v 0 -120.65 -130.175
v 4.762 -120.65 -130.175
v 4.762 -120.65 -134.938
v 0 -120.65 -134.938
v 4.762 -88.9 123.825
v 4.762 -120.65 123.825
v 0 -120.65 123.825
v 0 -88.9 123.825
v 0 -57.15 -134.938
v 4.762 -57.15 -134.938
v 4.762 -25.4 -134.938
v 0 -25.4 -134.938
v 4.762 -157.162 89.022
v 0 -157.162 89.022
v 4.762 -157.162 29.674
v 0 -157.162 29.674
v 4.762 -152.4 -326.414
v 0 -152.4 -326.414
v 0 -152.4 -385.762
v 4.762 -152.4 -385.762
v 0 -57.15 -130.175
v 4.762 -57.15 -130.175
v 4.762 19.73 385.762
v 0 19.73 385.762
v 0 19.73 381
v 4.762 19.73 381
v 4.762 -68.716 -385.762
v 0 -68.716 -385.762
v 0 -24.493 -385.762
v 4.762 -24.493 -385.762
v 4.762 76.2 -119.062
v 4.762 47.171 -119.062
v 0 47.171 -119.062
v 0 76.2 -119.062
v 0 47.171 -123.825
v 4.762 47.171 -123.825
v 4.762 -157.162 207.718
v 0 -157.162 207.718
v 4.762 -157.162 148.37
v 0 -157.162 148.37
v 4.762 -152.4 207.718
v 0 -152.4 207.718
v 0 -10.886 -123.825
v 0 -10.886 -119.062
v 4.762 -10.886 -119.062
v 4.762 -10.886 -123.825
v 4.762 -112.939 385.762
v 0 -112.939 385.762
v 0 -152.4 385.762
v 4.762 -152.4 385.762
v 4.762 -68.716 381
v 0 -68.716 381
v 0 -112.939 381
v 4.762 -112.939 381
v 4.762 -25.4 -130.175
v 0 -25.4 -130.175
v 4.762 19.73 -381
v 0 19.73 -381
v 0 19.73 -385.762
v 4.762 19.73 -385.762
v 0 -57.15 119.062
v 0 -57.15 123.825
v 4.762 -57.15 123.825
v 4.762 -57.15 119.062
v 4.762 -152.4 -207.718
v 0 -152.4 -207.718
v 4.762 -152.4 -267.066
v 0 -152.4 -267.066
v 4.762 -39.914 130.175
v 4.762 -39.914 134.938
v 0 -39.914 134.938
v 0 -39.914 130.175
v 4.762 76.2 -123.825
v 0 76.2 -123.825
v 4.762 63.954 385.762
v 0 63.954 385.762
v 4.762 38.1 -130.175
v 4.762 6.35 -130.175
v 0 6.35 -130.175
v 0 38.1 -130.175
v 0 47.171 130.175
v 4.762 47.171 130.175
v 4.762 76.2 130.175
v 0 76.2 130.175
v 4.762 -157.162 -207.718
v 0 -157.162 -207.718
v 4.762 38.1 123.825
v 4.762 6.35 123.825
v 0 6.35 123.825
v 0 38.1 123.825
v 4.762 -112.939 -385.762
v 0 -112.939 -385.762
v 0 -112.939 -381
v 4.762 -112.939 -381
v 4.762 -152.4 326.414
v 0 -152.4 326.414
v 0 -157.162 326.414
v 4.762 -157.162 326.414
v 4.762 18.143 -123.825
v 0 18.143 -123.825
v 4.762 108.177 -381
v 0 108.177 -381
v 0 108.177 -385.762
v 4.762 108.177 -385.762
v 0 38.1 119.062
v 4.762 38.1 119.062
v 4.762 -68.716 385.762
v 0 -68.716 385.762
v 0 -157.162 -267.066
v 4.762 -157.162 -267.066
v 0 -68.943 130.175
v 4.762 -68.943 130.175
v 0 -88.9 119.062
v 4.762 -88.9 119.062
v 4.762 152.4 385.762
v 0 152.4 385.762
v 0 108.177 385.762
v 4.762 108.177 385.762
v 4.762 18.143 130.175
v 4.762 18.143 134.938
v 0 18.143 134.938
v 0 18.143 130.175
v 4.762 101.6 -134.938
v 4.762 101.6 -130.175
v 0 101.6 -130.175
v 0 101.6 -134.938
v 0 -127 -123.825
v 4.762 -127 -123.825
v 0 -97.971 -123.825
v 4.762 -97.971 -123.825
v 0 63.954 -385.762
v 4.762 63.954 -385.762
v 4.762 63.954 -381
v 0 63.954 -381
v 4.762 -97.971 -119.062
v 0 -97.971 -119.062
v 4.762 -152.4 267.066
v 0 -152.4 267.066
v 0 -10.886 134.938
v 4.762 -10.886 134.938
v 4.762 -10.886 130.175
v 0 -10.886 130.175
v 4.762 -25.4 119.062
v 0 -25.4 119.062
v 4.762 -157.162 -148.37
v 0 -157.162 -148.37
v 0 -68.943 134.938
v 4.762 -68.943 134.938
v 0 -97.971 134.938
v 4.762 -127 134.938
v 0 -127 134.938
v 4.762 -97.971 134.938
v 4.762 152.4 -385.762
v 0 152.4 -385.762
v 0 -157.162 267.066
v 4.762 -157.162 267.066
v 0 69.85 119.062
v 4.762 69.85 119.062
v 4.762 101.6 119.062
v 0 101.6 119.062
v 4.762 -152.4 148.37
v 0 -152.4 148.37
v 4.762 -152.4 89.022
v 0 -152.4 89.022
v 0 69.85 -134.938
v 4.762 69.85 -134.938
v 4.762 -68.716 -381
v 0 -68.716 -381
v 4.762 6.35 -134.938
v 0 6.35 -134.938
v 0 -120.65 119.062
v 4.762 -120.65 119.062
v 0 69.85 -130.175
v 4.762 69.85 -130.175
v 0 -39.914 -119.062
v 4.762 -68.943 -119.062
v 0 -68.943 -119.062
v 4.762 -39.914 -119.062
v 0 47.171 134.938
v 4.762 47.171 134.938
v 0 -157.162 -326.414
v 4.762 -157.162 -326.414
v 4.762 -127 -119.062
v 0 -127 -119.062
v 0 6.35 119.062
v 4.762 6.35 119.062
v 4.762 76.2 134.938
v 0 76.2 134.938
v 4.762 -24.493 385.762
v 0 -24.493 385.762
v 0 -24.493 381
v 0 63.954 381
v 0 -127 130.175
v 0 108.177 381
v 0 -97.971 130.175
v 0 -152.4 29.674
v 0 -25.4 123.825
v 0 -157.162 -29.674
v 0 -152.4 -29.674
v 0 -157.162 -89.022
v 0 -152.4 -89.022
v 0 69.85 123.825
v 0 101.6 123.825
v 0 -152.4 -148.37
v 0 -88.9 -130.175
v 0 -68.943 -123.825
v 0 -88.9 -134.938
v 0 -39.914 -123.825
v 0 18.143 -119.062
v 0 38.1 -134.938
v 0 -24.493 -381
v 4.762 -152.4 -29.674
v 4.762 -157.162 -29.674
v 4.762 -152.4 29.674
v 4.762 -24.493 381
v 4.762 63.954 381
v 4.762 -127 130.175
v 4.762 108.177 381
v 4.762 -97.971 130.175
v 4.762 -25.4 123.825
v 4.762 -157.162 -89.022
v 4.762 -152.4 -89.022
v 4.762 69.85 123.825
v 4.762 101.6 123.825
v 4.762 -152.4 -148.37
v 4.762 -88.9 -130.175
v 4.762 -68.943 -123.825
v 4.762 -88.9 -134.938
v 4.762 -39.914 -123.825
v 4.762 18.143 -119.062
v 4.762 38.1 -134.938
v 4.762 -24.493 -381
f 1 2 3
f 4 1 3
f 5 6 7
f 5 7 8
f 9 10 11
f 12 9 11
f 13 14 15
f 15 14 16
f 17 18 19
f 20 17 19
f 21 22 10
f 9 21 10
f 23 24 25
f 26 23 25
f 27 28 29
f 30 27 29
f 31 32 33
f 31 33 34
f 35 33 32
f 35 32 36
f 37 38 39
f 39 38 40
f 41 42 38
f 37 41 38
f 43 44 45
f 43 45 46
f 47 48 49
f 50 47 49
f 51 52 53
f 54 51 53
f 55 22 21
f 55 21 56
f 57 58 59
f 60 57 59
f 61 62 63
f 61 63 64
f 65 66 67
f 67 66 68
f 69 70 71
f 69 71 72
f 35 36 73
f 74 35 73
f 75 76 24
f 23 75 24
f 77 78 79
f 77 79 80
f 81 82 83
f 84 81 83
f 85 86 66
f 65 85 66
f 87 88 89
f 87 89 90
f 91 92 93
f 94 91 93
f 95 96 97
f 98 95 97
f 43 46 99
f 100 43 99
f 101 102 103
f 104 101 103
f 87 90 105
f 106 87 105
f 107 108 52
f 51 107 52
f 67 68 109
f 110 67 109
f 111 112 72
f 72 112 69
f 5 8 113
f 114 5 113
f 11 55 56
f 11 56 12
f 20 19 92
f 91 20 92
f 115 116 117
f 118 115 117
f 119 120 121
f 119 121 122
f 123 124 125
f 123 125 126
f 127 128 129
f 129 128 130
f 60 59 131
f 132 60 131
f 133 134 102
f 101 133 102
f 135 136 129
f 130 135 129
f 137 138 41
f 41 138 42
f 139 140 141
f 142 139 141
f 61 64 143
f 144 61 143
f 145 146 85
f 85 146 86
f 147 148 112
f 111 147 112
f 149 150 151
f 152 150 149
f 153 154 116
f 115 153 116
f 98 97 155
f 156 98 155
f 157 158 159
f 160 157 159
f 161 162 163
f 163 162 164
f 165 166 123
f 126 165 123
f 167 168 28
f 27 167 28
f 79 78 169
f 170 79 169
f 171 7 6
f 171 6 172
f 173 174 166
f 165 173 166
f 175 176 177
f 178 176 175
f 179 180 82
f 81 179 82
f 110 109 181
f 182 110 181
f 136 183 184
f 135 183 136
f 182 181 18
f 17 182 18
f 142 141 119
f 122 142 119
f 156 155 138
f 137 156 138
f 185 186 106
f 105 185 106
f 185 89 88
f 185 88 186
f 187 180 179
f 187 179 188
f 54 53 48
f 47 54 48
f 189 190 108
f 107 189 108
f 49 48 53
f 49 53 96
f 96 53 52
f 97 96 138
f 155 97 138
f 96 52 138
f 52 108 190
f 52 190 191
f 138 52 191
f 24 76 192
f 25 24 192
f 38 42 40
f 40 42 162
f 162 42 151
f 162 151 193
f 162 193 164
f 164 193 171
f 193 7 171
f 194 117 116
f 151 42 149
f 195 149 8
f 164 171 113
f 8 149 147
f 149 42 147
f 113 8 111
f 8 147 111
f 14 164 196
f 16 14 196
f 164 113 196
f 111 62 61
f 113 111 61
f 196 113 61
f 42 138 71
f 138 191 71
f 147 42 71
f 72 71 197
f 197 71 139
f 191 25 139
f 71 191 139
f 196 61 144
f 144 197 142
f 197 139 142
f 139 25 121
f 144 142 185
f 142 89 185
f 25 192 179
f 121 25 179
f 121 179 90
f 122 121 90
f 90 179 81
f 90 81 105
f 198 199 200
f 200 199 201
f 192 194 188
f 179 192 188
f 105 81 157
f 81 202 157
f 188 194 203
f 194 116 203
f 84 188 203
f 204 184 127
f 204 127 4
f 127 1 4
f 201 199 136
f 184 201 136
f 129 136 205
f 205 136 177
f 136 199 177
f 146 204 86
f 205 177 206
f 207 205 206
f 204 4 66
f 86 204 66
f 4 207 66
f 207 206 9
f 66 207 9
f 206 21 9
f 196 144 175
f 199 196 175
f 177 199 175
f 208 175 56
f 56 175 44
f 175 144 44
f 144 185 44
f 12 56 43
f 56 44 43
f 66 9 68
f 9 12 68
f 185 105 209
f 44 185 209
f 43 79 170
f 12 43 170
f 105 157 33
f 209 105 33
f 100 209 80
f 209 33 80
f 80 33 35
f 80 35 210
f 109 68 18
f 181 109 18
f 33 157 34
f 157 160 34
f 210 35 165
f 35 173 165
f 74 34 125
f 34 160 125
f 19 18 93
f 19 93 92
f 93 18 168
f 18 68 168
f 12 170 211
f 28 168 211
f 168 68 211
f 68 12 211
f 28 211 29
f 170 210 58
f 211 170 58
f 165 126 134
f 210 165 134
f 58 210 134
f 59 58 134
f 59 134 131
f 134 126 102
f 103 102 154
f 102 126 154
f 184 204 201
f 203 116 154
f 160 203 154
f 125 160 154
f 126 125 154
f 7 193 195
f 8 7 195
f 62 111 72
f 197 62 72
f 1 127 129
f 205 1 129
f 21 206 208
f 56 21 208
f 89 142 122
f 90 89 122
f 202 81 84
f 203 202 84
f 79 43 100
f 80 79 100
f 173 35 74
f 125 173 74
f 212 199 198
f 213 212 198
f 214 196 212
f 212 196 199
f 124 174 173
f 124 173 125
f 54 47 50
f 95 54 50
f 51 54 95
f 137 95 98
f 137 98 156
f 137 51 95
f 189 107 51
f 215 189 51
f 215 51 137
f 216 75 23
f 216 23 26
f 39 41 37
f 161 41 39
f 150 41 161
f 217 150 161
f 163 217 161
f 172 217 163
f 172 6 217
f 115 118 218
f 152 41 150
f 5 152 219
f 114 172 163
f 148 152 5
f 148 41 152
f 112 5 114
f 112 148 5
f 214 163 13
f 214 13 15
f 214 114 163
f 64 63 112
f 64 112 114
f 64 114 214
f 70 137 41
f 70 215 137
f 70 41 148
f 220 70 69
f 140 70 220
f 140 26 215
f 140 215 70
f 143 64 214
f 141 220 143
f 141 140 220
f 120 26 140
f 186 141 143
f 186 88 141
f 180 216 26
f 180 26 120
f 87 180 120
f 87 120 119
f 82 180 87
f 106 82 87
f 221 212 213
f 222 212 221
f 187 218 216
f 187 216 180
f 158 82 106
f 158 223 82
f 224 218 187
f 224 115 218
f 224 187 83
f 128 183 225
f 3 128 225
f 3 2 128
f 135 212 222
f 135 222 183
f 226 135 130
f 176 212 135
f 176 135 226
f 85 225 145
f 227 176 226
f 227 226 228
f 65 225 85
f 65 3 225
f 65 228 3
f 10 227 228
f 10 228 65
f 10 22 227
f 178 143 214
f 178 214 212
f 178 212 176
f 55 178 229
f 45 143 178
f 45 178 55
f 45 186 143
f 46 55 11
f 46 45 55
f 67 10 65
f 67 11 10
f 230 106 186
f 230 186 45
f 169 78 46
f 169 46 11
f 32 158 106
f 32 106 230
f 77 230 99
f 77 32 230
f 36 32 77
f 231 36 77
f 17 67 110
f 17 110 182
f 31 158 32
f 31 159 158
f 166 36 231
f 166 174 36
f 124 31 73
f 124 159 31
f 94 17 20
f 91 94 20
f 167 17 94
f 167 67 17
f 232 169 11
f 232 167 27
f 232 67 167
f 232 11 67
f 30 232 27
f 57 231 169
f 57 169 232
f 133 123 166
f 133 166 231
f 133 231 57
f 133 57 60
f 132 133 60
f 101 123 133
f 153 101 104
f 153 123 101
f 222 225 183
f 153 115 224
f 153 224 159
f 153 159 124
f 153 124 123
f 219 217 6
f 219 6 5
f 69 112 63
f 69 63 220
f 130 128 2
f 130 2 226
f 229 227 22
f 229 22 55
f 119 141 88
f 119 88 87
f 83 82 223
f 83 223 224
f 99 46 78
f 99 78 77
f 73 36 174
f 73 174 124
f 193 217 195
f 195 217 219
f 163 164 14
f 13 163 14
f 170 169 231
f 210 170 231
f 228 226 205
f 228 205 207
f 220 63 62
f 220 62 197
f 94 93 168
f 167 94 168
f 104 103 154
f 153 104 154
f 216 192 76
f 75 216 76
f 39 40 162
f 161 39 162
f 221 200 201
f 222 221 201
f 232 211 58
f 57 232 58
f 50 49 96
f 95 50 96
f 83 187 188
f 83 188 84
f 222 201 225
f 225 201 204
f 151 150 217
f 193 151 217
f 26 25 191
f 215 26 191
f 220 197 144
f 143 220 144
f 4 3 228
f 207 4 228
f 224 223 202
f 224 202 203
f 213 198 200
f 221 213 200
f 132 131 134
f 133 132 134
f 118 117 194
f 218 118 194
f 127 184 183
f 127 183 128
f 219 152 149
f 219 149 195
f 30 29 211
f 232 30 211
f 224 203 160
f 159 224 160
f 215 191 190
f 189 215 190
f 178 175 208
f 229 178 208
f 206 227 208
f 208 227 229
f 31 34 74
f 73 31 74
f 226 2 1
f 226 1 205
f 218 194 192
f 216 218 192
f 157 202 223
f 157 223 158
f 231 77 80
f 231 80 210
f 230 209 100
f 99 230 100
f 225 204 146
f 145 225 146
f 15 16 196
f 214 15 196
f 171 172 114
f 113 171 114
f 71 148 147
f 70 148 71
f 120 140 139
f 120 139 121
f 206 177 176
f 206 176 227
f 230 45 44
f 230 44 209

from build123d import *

# Parameters (mm, degrees)
BOSS_EXTRUDE1_DEPTH = 4.7625
SKETCH3_W           = 4.7625
SKETCH3_H           = 31.75
SKETCH3_H_2         = 29.028571429
CUT_EXTRUDE1_DEPTH  = 417.575850499


with BuildPart() as part:
    # Sketch1 → Boss-Extrude1 (new body)
    with BuildSketch(Plane(origin=(0, 0, 0), x_dir=(0, 0, -1), z_dir=(1, 0, 0))):
        Polygon((381, 152.4), (-385.7625, 152.4), (-385.7625, 108.176785714), (-381, 108.176785714), (-381, 63.953571429), (-385.7625, 63.953571429), (-385.7625, 19.730357143), (-381, 19.730357143), (-381, -24.492857143), (-385.7625, -24.492857143), (-385.7625, -68.716071429), (-381, -68.716071429), (-381, -112.939285714), (-385.7625, -112.939285714), (-385.7625, -152.4), (-326.414423077, -152.4), (-326.414423077, -157.1625), (-267.066346154, -157.1625), (-267.066346154, -152.4), (-207.718269231, -152.4), (-207.718269231, -157.1625), (-148.370192308, -157.1625), (-148.370192308, -152.4), (-89.022115385, -152.4), (-89.022115385, -157.1625), (-29.674038462, -157.1625), (-29.674038462, -152.4), (29.674038462, -152.4), (29.674038462, -157.1625), (89.022115385, -157.1625), (89.022115385, -152.4), (148.370192308, -152.4), (148.370192308, -157.1625), (207.718269231, -157.1625), (207.718269231, -152.4), (267.066346154, -152.4), (267.066346154, -157.1625), (326.414423077, -157.1625), (326.414423077, -152.4), (385.7625, -152.4), (385.7625, -112.939285714), (381, -112.939285714), (381, -68.716071429), (385.7625, -68.716071429), (385.7625, -24.492857143), (381, -24.492857143), (381, 19.730357143), (385.7625, 19.730357143), (385.7625, 63.953571429), (381, 63.953571429), (381, 108.176785714), (385.7625, 108.176785714), (385.7625, 152.4), align=None)
    extrude(amount=BOSS_EXTRUDE1_DEPTH)

    # Sketch3 → Cut-Extrude1 (cut, through all)
    with BuildSketch(Plane(origin=(4.7625, 0, 0), x_dir=(0, 0, -1), z_dir=(1, 0, 0))):
        with Locations((-121.44375, -104.775)):
            Rectangle(SKETCH3_W, SKETCH3_H)
        with Locations((-121.44375, -41.275)):
            Rectangle(SKETCH3_W, SKETCH3_H)
        with Locations((-121.44375, 22.225)):
            Rectangle(SKETCH3_W, SKETCH3_H)
        with Locations((-121.44375, 85.725)):
            Rectangle(SKETCH3_W, SKETCH3_H)
        with Locations((-132.55625, 61.685714285)):
            Rectangle(SKETCH3_W, SKETCH3_H_2)
        with Locations((-132.55625, 3.628571428)):
            Rectangle(SKETCH3_W, SKETCH3_H_2)
        with Locations((-132.55625, -54.428571428)):
            Rectangle(SKETCH3_W, SKETCH3_H_2)
        with Locations((-132.55625, -112.485714286)):
            Rectangle(SKETCH3_W, SKETCH3_H_2)
        with Locations((132.55625, 85.725)):
            Rectangle(SKETCH3_W, SKETCH3_H)
        with Locations((121.44375, 61.685714285)):
            Rectangle(SKETCH3_W, SKETCH3_H_2)
        with Locations((132.55625, 22.225)):
            Rectangle(SKETCH3_W, SKETCH3_H)
        with Locations((121.44375, 3.628571428)):
            Rectangle(SKETCH3_W, SKETCH3_H_2)
        with Locations((132.55625, -41.275)):
            Rectangle(SKETCH3_W, SKETCH3_H)
        with Locations((121.44375, -54.428571428)):
            Rectangle(SKETCH3_W, SKETCH3_H_2)
        with Locations((132.55625, -104.775)):
            Rectangle(SKETCH3_W, SKETCH3_H)
        with Locations((121.44375, -112.485714286)):
            Rectangle(SKETCH3_W, SKETCH3_H_2)
    extrude(amount=-CUT_EXTRUDE1_DEPTH, mode=Mode.SUBTRACT)


solid = part.part
